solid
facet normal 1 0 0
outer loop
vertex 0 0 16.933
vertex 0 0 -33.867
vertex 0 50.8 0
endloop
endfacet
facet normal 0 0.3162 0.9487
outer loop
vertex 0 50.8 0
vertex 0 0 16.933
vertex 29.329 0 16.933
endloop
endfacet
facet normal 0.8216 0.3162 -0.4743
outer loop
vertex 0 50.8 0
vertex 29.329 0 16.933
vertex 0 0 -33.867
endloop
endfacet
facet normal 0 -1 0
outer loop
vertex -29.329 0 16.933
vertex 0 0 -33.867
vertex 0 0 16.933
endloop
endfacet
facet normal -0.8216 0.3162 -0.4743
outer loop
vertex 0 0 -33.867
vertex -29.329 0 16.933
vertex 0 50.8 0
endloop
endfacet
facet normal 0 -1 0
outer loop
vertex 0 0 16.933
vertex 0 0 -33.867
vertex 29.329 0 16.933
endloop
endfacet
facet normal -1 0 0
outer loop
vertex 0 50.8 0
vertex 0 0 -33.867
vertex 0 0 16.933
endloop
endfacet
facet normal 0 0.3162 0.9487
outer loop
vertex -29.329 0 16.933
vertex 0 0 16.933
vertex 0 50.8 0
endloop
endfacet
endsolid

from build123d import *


with BuildPart() as part:
    # Sketch1 → Loft1 section 0
    with BuildSketch(Plane(origin=(0, 0, 0), x_dir=(1, 0, 0), z_dir=(0, 1, 0)), mode=Mode.PRIVATE) as loft1_s0:
        with BuildLine():
            Line((0, 33.866666667), (0, -16.933333333))
            Line((0, -16.933333333), (-29.329393675, -16.933333333))
            Line((-29.329393675, -16.933333333), (0, 33.866666667))
        make_face()
    loft([loft1_s0.sketch, Vertex(0, 50.8, 0)])


with BuildPart() as body_2:
    # Sketch3 → Loft2 section 0
    with BuildSketch(Plane(origin=(0, 0, 0), x_dir=(1, 0, 0), z_dir=(0, 1, 0)), mode=Mode.PRIVATE) as loft2_s0:
        with BuildLine():
            Line((0, 33.866666667), (0, -16.933333333))
            Line((0, -16.933333333), (29.329393675, -16.933333333))
            Line((29.329393675, -16.933333333), (0, 33.866666667))
        make_face()
    loft([loft2_s0.sketch, Vertex(0, 50.8, 0)])


solid = Compound([part.part, body_2.part])
